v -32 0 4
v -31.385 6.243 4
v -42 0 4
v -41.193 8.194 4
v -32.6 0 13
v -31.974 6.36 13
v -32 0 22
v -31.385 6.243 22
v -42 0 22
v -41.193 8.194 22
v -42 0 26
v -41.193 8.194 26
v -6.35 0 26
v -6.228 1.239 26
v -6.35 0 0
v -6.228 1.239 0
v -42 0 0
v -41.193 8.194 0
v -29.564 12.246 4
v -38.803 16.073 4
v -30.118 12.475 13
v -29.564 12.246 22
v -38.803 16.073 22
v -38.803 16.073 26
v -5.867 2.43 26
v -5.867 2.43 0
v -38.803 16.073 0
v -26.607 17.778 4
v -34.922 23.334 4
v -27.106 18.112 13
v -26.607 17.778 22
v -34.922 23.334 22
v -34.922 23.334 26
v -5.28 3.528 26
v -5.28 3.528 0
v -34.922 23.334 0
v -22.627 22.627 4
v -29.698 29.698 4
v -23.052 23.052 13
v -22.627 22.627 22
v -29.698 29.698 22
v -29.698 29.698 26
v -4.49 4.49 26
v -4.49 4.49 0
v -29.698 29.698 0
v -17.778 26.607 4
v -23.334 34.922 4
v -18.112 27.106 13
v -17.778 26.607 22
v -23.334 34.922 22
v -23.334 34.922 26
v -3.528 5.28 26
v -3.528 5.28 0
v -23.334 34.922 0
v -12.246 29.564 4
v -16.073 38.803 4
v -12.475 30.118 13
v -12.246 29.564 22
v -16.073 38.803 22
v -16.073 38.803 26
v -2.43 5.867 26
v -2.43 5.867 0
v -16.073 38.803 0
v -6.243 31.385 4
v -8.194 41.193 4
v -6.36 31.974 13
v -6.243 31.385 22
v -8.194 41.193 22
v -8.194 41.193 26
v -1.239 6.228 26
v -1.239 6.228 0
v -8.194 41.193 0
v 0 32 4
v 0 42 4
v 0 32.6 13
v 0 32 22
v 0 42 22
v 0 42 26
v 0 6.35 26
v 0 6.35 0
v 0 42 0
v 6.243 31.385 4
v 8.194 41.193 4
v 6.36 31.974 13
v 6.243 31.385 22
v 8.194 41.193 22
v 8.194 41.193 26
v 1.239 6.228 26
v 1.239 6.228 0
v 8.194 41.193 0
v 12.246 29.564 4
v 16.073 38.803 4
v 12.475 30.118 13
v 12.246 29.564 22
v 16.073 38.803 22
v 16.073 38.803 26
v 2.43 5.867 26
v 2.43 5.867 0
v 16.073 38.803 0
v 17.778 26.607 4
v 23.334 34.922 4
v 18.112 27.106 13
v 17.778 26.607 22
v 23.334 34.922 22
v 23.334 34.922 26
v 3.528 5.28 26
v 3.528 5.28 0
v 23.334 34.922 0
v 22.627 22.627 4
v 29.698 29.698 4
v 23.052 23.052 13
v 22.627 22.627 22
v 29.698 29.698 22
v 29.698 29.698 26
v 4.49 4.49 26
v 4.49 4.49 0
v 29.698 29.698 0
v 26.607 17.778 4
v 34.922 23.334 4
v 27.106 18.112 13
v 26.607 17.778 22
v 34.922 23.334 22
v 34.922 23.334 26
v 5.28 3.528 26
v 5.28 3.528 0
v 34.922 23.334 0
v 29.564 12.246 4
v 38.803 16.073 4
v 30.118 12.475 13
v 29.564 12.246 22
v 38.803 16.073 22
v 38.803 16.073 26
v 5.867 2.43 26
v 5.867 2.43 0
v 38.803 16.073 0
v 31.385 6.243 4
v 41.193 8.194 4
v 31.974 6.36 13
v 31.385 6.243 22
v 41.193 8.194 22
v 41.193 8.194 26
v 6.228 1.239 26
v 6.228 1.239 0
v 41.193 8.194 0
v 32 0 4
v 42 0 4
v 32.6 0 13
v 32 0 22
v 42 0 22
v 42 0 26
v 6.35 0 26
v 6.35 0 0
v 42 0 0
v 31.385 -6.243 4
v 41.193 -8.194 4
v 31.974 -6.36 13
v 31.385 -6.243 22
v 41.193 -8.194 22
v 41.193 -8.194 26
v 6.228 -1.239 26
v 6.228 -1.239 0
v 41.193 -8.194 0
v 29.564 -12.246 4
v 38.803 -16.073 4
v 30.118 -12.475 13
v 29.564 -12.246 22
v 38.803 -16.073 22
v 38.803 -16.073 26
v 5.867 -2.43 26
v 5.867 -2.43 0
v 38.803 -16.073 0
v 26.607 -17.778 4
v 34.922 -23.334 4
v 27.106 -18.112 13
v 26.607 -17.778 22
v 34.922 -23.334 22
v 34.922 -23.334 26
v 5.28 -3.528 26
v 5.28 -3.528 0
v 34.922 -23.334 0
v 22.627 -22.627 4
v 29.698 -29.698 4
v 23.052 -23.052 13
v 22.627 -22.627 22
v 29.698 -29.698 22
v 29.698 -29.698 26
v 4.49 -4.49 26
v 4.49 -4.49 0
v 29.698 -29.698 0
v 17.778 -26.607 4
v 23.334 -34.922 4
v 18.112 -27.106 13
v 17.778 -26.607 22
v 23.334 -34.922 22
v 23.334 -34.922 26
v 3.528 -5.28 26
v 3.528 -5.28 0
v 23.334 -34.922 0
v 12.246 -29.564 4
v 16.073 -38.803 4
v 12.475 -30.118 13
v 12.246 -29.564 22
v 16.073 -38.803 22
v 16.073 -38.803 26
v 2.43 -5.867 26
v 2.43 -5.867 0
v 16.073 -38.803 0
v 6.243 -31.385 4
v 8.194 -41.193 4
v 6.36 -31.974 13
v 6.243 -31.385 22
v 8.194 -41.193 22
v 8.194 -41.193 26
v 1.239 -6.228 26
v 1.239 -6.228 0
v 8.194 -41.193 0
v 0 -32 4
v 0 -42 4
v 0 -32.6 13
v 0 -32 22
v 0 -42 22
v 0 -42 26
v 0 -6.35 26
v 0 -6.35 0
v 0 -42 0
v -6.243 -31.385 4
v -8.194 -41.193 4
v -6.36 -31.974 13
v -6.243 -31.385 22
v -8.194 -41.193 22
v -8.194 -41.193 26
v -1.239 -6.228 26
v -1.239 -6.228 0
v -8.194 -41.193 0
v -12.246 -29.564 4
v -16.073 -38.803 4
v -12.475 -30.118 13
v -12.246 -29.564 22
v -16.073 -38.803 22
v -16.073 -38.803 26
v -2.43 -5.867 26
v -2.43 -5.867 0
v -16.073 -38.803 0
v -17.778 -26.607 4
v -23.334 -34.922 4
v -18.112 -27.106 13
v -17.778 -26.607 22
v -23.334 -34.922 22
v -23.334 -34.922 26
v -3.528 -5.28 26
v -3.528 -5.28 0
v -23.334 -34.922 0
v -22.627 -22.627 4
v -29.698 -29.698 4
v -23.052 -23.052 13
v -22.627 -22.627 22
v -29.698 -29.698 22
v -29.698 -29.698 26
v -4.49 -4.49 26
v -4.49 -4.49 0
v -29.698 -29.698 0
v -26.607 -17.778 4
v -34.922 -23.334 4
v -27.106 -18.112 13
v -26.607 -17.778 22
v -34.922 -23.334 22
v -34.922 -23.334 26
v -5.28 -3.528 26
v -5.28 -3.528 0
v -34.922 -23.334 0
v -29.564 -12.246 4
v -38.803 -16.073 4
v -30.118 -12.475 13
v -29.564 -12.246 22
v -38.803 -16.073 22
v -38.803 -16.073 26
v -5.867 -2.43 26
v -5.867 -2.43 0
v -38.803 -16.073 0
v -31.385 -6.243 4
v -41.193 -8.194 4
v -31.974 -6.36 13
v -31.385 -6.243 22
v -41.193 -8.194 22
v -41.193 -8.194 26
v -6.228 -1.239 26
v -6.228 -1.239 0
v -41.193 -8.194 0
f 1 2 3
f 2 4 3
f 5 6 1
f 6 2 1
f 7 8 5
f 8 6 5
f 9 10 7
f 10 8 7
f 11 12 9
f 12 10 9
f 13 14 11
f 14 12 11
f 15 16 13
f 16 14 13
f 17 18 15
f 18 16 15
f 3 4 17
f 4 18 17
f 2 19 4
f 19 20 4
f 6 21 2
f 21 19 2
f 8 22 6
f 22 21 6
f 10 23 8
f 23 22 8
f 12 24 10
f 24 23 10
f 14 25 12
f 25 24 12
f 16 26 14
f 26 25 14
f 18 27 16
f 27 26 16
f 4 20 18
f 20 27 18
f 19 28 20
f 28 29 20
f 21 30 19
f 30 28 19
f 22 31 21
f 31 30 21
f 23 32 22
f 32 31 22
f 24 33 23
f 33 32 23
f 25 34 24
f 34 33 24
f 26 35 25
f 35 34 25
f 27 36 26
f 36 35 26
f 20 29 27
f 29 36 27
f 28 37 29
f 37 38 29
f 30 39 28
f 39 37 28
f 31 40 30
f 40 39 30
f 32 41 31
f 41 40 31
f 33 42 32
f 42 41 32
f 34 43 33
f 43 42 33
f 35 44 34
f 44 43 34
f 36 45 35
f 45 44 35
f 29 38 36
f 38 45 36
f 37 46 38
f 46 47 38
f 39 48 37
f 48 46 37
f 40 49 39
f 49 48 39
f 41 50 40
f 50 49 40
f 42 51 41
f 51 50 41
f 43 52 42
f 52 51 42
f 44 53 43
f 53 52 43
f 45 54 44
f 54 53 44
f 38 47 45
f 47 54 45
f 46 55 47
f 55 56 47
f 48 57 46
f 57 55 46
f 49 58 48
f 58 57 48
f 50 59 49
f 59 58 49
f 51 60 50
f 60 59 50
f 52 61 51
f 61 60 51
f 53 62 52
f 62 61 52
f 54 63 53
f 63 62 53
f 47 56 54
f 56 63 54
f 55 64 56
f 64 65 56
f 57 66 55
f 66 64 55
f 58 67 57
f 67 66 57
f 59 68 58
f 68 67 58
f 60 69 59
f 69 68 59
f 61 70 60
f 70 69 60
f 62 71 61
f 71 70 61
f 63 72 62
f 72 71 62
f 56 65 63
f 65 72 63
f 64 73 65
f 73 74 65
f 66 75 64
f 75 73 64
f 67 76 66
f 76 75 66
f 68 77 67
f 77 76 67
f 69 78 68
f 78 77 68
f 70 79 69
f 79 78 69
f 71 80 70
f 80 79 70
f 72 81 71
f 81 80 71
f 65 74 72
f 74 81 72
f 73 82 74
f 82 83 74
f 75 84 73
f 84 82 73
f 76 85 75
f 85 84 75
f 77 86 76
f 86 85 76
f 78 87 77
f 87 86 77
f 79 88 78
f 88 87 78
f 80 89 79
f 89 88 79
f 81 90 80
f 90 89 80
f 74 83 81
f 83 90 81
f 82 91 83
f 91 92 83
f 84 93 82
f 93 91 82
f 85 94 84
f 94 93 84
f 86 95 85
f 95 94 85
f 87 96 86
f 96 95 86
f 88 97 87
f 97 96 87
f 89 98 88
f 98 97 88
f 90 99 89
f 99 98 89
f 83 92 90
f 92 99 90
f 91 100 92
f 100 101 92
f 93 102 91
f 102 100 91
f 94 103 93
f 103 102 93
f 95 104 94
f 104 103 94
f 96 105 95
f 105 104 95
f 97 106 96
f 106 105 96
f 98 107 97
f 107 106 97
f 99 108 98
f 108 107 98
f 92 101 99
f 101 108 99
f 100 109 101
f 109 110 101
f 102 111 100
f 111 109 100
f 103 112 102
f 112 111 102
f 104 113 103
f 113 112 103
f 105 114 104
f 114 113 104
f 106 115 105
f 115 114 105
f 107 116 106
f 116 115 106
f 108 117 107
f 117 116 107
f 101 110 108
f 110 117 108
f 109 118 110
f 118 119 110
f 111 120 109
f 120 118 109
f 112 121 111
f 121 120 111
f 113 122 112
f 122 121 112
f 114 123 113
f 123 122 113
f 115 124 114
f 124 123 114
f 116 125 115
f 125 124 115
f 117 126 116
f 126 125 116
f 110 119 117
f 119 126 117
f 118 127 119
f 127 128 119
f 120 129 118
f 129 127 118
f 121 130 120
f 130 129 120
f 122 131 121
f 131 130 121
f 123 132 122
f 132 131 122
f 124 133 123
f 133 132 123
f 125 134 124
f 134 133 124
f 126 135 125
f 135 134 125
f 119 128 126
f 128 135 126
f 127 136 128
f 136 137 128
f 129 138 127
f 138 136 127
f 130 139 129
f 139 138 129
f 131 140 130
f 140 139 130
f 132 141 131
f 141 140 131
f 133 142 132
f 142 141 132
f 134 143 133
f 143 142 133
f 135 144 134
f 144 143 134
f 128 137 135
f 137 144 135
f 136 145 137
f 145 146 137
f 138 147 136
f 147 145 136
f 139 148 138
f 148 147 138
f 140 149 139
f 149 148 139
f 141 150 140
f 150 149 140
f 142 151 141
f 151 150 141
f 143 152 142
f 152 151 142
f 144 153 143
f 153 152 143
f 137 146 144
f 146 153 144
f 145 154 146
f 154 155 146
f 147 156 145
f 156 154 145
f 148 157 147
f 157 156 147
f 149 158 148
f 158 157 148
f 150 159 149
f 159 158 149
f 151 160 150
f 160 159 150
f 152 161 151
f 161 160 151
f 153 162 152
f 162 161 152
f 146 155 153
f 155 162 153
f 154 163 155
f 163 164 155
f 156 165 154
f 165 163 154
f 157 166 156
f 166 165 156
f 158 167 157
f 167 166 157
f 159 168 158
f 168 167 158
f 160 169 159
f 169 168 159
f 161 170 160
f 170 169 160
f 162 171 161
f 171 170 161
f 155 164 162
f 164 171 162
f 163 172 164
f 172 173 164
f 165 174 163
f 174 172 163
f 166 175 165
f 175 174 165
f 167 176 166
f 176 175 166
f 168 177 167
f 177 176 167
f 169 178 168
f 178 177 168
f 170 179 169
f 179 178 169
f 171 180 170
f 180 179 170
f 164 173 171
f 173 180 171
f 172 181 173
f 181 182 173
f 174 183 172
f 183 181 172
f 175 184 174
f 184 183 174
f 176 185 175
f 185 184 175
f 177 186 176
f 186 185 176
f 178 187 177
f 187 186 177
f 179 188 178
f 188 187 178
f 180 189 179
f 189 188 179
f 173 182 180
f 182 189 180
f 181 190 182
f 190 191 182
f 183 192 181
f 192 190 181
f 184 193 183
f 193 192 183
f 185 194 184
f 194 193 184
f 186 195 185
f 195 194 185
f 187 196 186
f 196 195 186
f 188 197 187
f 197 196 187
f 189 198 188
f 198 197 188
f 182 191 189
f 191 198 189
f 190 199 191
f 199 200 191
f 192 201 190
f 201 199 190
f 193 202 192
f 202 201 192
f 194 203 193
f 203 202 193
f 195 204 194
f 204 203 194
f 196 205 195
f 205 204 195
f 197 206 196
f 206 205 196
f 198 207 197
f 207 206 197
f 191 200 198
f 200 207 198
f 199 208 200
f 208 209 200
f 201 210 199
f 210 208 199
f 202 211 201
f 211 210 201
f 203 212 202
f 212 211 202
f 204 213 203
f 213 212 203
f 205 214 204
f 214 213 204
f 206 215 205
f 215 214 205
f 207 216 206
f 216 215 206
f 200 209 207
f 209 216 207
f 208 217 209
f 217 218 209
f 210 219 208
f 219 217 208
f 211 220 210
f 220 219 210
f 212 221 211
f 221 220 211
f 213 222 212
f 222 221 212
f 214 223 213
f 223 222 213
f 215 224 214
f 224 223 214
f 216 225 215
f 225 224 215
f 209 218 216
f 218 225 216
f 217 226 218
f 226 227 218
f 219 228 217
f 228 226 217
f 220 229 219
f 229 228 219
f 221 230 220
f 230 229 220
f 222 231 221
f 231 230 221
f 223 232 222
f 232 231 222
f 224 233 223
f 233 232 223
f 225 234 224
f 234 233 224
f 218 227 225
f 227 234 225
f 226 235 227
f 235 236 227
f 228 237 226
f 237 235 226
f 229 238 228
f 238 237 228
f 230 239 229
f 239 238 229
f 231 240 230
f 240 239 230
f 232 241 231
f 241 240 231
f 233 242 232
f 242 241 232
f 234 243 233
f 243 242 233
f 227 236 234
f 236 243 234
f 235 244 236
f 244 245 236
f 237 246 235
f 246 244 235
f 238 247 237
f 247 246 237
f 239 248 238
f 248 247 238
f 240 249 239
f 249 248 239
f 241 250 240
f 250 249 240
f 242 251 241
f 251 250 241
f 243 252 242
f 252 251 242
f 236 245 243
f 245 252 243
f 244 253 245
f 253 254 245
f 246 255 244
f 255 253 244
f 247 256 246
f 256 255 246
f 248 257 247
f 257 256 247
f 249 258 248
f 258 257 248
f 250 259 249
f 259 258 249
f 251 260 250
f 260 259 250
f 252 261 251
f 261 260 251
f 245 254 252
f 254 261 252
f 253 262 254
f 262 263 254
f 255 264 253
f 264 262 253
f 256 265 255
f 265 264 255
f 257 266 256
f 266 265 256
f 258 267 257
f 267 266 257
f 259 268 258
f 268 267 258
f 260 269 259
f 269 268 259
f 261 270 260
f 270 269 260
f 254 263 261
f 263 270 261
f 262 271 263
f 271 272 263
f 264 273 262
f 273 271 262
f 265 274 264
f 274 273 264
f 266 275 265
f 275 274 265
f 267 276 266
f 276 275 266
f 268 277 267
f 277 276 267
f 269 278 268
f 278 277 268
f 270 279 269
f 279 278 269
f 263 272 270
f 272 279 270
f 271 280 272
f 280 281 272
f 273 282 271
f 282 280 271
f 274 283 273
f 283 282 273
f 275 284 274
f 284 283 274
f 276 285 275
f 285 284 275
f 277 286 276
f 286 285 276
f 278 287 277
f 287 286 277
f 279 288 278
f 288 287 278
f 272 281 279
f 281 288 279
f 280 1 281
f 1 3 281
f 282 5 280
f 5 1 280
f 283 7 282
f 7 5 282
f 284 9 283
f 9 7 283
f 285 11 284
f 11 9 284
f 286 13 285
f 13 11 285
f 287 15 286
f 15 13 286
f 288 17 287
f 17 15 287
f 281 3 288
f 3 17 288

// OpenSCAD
$fn = 32;

// ----------------------------------------------------------------------
// Belt roller: 64 mm barrel, 26 mm wide, bore 12.7 mm
// ----------------------------------------------------------------------

// --- parameters (mm) ---
bore_d = 12.7;            // bore
barrel_d = 64;            // barrel diameter
roller_w = 26;            // roller width
flange_d = 84;            // flange diameter
flange_t = 4;             // flange thickness
hub_d = 32.7;             // hub diameter

roller_profile = [[6.35, 0], [42, 0], [42, 4], [32, 4], [32.6, 13], [32, 22], [42, 22], [42, 26], [6.35, 26]];

/* the profile stays clear of the axis, so the bore comes out of the revolve */
rotate_extrude() polygon(roller_profile);
